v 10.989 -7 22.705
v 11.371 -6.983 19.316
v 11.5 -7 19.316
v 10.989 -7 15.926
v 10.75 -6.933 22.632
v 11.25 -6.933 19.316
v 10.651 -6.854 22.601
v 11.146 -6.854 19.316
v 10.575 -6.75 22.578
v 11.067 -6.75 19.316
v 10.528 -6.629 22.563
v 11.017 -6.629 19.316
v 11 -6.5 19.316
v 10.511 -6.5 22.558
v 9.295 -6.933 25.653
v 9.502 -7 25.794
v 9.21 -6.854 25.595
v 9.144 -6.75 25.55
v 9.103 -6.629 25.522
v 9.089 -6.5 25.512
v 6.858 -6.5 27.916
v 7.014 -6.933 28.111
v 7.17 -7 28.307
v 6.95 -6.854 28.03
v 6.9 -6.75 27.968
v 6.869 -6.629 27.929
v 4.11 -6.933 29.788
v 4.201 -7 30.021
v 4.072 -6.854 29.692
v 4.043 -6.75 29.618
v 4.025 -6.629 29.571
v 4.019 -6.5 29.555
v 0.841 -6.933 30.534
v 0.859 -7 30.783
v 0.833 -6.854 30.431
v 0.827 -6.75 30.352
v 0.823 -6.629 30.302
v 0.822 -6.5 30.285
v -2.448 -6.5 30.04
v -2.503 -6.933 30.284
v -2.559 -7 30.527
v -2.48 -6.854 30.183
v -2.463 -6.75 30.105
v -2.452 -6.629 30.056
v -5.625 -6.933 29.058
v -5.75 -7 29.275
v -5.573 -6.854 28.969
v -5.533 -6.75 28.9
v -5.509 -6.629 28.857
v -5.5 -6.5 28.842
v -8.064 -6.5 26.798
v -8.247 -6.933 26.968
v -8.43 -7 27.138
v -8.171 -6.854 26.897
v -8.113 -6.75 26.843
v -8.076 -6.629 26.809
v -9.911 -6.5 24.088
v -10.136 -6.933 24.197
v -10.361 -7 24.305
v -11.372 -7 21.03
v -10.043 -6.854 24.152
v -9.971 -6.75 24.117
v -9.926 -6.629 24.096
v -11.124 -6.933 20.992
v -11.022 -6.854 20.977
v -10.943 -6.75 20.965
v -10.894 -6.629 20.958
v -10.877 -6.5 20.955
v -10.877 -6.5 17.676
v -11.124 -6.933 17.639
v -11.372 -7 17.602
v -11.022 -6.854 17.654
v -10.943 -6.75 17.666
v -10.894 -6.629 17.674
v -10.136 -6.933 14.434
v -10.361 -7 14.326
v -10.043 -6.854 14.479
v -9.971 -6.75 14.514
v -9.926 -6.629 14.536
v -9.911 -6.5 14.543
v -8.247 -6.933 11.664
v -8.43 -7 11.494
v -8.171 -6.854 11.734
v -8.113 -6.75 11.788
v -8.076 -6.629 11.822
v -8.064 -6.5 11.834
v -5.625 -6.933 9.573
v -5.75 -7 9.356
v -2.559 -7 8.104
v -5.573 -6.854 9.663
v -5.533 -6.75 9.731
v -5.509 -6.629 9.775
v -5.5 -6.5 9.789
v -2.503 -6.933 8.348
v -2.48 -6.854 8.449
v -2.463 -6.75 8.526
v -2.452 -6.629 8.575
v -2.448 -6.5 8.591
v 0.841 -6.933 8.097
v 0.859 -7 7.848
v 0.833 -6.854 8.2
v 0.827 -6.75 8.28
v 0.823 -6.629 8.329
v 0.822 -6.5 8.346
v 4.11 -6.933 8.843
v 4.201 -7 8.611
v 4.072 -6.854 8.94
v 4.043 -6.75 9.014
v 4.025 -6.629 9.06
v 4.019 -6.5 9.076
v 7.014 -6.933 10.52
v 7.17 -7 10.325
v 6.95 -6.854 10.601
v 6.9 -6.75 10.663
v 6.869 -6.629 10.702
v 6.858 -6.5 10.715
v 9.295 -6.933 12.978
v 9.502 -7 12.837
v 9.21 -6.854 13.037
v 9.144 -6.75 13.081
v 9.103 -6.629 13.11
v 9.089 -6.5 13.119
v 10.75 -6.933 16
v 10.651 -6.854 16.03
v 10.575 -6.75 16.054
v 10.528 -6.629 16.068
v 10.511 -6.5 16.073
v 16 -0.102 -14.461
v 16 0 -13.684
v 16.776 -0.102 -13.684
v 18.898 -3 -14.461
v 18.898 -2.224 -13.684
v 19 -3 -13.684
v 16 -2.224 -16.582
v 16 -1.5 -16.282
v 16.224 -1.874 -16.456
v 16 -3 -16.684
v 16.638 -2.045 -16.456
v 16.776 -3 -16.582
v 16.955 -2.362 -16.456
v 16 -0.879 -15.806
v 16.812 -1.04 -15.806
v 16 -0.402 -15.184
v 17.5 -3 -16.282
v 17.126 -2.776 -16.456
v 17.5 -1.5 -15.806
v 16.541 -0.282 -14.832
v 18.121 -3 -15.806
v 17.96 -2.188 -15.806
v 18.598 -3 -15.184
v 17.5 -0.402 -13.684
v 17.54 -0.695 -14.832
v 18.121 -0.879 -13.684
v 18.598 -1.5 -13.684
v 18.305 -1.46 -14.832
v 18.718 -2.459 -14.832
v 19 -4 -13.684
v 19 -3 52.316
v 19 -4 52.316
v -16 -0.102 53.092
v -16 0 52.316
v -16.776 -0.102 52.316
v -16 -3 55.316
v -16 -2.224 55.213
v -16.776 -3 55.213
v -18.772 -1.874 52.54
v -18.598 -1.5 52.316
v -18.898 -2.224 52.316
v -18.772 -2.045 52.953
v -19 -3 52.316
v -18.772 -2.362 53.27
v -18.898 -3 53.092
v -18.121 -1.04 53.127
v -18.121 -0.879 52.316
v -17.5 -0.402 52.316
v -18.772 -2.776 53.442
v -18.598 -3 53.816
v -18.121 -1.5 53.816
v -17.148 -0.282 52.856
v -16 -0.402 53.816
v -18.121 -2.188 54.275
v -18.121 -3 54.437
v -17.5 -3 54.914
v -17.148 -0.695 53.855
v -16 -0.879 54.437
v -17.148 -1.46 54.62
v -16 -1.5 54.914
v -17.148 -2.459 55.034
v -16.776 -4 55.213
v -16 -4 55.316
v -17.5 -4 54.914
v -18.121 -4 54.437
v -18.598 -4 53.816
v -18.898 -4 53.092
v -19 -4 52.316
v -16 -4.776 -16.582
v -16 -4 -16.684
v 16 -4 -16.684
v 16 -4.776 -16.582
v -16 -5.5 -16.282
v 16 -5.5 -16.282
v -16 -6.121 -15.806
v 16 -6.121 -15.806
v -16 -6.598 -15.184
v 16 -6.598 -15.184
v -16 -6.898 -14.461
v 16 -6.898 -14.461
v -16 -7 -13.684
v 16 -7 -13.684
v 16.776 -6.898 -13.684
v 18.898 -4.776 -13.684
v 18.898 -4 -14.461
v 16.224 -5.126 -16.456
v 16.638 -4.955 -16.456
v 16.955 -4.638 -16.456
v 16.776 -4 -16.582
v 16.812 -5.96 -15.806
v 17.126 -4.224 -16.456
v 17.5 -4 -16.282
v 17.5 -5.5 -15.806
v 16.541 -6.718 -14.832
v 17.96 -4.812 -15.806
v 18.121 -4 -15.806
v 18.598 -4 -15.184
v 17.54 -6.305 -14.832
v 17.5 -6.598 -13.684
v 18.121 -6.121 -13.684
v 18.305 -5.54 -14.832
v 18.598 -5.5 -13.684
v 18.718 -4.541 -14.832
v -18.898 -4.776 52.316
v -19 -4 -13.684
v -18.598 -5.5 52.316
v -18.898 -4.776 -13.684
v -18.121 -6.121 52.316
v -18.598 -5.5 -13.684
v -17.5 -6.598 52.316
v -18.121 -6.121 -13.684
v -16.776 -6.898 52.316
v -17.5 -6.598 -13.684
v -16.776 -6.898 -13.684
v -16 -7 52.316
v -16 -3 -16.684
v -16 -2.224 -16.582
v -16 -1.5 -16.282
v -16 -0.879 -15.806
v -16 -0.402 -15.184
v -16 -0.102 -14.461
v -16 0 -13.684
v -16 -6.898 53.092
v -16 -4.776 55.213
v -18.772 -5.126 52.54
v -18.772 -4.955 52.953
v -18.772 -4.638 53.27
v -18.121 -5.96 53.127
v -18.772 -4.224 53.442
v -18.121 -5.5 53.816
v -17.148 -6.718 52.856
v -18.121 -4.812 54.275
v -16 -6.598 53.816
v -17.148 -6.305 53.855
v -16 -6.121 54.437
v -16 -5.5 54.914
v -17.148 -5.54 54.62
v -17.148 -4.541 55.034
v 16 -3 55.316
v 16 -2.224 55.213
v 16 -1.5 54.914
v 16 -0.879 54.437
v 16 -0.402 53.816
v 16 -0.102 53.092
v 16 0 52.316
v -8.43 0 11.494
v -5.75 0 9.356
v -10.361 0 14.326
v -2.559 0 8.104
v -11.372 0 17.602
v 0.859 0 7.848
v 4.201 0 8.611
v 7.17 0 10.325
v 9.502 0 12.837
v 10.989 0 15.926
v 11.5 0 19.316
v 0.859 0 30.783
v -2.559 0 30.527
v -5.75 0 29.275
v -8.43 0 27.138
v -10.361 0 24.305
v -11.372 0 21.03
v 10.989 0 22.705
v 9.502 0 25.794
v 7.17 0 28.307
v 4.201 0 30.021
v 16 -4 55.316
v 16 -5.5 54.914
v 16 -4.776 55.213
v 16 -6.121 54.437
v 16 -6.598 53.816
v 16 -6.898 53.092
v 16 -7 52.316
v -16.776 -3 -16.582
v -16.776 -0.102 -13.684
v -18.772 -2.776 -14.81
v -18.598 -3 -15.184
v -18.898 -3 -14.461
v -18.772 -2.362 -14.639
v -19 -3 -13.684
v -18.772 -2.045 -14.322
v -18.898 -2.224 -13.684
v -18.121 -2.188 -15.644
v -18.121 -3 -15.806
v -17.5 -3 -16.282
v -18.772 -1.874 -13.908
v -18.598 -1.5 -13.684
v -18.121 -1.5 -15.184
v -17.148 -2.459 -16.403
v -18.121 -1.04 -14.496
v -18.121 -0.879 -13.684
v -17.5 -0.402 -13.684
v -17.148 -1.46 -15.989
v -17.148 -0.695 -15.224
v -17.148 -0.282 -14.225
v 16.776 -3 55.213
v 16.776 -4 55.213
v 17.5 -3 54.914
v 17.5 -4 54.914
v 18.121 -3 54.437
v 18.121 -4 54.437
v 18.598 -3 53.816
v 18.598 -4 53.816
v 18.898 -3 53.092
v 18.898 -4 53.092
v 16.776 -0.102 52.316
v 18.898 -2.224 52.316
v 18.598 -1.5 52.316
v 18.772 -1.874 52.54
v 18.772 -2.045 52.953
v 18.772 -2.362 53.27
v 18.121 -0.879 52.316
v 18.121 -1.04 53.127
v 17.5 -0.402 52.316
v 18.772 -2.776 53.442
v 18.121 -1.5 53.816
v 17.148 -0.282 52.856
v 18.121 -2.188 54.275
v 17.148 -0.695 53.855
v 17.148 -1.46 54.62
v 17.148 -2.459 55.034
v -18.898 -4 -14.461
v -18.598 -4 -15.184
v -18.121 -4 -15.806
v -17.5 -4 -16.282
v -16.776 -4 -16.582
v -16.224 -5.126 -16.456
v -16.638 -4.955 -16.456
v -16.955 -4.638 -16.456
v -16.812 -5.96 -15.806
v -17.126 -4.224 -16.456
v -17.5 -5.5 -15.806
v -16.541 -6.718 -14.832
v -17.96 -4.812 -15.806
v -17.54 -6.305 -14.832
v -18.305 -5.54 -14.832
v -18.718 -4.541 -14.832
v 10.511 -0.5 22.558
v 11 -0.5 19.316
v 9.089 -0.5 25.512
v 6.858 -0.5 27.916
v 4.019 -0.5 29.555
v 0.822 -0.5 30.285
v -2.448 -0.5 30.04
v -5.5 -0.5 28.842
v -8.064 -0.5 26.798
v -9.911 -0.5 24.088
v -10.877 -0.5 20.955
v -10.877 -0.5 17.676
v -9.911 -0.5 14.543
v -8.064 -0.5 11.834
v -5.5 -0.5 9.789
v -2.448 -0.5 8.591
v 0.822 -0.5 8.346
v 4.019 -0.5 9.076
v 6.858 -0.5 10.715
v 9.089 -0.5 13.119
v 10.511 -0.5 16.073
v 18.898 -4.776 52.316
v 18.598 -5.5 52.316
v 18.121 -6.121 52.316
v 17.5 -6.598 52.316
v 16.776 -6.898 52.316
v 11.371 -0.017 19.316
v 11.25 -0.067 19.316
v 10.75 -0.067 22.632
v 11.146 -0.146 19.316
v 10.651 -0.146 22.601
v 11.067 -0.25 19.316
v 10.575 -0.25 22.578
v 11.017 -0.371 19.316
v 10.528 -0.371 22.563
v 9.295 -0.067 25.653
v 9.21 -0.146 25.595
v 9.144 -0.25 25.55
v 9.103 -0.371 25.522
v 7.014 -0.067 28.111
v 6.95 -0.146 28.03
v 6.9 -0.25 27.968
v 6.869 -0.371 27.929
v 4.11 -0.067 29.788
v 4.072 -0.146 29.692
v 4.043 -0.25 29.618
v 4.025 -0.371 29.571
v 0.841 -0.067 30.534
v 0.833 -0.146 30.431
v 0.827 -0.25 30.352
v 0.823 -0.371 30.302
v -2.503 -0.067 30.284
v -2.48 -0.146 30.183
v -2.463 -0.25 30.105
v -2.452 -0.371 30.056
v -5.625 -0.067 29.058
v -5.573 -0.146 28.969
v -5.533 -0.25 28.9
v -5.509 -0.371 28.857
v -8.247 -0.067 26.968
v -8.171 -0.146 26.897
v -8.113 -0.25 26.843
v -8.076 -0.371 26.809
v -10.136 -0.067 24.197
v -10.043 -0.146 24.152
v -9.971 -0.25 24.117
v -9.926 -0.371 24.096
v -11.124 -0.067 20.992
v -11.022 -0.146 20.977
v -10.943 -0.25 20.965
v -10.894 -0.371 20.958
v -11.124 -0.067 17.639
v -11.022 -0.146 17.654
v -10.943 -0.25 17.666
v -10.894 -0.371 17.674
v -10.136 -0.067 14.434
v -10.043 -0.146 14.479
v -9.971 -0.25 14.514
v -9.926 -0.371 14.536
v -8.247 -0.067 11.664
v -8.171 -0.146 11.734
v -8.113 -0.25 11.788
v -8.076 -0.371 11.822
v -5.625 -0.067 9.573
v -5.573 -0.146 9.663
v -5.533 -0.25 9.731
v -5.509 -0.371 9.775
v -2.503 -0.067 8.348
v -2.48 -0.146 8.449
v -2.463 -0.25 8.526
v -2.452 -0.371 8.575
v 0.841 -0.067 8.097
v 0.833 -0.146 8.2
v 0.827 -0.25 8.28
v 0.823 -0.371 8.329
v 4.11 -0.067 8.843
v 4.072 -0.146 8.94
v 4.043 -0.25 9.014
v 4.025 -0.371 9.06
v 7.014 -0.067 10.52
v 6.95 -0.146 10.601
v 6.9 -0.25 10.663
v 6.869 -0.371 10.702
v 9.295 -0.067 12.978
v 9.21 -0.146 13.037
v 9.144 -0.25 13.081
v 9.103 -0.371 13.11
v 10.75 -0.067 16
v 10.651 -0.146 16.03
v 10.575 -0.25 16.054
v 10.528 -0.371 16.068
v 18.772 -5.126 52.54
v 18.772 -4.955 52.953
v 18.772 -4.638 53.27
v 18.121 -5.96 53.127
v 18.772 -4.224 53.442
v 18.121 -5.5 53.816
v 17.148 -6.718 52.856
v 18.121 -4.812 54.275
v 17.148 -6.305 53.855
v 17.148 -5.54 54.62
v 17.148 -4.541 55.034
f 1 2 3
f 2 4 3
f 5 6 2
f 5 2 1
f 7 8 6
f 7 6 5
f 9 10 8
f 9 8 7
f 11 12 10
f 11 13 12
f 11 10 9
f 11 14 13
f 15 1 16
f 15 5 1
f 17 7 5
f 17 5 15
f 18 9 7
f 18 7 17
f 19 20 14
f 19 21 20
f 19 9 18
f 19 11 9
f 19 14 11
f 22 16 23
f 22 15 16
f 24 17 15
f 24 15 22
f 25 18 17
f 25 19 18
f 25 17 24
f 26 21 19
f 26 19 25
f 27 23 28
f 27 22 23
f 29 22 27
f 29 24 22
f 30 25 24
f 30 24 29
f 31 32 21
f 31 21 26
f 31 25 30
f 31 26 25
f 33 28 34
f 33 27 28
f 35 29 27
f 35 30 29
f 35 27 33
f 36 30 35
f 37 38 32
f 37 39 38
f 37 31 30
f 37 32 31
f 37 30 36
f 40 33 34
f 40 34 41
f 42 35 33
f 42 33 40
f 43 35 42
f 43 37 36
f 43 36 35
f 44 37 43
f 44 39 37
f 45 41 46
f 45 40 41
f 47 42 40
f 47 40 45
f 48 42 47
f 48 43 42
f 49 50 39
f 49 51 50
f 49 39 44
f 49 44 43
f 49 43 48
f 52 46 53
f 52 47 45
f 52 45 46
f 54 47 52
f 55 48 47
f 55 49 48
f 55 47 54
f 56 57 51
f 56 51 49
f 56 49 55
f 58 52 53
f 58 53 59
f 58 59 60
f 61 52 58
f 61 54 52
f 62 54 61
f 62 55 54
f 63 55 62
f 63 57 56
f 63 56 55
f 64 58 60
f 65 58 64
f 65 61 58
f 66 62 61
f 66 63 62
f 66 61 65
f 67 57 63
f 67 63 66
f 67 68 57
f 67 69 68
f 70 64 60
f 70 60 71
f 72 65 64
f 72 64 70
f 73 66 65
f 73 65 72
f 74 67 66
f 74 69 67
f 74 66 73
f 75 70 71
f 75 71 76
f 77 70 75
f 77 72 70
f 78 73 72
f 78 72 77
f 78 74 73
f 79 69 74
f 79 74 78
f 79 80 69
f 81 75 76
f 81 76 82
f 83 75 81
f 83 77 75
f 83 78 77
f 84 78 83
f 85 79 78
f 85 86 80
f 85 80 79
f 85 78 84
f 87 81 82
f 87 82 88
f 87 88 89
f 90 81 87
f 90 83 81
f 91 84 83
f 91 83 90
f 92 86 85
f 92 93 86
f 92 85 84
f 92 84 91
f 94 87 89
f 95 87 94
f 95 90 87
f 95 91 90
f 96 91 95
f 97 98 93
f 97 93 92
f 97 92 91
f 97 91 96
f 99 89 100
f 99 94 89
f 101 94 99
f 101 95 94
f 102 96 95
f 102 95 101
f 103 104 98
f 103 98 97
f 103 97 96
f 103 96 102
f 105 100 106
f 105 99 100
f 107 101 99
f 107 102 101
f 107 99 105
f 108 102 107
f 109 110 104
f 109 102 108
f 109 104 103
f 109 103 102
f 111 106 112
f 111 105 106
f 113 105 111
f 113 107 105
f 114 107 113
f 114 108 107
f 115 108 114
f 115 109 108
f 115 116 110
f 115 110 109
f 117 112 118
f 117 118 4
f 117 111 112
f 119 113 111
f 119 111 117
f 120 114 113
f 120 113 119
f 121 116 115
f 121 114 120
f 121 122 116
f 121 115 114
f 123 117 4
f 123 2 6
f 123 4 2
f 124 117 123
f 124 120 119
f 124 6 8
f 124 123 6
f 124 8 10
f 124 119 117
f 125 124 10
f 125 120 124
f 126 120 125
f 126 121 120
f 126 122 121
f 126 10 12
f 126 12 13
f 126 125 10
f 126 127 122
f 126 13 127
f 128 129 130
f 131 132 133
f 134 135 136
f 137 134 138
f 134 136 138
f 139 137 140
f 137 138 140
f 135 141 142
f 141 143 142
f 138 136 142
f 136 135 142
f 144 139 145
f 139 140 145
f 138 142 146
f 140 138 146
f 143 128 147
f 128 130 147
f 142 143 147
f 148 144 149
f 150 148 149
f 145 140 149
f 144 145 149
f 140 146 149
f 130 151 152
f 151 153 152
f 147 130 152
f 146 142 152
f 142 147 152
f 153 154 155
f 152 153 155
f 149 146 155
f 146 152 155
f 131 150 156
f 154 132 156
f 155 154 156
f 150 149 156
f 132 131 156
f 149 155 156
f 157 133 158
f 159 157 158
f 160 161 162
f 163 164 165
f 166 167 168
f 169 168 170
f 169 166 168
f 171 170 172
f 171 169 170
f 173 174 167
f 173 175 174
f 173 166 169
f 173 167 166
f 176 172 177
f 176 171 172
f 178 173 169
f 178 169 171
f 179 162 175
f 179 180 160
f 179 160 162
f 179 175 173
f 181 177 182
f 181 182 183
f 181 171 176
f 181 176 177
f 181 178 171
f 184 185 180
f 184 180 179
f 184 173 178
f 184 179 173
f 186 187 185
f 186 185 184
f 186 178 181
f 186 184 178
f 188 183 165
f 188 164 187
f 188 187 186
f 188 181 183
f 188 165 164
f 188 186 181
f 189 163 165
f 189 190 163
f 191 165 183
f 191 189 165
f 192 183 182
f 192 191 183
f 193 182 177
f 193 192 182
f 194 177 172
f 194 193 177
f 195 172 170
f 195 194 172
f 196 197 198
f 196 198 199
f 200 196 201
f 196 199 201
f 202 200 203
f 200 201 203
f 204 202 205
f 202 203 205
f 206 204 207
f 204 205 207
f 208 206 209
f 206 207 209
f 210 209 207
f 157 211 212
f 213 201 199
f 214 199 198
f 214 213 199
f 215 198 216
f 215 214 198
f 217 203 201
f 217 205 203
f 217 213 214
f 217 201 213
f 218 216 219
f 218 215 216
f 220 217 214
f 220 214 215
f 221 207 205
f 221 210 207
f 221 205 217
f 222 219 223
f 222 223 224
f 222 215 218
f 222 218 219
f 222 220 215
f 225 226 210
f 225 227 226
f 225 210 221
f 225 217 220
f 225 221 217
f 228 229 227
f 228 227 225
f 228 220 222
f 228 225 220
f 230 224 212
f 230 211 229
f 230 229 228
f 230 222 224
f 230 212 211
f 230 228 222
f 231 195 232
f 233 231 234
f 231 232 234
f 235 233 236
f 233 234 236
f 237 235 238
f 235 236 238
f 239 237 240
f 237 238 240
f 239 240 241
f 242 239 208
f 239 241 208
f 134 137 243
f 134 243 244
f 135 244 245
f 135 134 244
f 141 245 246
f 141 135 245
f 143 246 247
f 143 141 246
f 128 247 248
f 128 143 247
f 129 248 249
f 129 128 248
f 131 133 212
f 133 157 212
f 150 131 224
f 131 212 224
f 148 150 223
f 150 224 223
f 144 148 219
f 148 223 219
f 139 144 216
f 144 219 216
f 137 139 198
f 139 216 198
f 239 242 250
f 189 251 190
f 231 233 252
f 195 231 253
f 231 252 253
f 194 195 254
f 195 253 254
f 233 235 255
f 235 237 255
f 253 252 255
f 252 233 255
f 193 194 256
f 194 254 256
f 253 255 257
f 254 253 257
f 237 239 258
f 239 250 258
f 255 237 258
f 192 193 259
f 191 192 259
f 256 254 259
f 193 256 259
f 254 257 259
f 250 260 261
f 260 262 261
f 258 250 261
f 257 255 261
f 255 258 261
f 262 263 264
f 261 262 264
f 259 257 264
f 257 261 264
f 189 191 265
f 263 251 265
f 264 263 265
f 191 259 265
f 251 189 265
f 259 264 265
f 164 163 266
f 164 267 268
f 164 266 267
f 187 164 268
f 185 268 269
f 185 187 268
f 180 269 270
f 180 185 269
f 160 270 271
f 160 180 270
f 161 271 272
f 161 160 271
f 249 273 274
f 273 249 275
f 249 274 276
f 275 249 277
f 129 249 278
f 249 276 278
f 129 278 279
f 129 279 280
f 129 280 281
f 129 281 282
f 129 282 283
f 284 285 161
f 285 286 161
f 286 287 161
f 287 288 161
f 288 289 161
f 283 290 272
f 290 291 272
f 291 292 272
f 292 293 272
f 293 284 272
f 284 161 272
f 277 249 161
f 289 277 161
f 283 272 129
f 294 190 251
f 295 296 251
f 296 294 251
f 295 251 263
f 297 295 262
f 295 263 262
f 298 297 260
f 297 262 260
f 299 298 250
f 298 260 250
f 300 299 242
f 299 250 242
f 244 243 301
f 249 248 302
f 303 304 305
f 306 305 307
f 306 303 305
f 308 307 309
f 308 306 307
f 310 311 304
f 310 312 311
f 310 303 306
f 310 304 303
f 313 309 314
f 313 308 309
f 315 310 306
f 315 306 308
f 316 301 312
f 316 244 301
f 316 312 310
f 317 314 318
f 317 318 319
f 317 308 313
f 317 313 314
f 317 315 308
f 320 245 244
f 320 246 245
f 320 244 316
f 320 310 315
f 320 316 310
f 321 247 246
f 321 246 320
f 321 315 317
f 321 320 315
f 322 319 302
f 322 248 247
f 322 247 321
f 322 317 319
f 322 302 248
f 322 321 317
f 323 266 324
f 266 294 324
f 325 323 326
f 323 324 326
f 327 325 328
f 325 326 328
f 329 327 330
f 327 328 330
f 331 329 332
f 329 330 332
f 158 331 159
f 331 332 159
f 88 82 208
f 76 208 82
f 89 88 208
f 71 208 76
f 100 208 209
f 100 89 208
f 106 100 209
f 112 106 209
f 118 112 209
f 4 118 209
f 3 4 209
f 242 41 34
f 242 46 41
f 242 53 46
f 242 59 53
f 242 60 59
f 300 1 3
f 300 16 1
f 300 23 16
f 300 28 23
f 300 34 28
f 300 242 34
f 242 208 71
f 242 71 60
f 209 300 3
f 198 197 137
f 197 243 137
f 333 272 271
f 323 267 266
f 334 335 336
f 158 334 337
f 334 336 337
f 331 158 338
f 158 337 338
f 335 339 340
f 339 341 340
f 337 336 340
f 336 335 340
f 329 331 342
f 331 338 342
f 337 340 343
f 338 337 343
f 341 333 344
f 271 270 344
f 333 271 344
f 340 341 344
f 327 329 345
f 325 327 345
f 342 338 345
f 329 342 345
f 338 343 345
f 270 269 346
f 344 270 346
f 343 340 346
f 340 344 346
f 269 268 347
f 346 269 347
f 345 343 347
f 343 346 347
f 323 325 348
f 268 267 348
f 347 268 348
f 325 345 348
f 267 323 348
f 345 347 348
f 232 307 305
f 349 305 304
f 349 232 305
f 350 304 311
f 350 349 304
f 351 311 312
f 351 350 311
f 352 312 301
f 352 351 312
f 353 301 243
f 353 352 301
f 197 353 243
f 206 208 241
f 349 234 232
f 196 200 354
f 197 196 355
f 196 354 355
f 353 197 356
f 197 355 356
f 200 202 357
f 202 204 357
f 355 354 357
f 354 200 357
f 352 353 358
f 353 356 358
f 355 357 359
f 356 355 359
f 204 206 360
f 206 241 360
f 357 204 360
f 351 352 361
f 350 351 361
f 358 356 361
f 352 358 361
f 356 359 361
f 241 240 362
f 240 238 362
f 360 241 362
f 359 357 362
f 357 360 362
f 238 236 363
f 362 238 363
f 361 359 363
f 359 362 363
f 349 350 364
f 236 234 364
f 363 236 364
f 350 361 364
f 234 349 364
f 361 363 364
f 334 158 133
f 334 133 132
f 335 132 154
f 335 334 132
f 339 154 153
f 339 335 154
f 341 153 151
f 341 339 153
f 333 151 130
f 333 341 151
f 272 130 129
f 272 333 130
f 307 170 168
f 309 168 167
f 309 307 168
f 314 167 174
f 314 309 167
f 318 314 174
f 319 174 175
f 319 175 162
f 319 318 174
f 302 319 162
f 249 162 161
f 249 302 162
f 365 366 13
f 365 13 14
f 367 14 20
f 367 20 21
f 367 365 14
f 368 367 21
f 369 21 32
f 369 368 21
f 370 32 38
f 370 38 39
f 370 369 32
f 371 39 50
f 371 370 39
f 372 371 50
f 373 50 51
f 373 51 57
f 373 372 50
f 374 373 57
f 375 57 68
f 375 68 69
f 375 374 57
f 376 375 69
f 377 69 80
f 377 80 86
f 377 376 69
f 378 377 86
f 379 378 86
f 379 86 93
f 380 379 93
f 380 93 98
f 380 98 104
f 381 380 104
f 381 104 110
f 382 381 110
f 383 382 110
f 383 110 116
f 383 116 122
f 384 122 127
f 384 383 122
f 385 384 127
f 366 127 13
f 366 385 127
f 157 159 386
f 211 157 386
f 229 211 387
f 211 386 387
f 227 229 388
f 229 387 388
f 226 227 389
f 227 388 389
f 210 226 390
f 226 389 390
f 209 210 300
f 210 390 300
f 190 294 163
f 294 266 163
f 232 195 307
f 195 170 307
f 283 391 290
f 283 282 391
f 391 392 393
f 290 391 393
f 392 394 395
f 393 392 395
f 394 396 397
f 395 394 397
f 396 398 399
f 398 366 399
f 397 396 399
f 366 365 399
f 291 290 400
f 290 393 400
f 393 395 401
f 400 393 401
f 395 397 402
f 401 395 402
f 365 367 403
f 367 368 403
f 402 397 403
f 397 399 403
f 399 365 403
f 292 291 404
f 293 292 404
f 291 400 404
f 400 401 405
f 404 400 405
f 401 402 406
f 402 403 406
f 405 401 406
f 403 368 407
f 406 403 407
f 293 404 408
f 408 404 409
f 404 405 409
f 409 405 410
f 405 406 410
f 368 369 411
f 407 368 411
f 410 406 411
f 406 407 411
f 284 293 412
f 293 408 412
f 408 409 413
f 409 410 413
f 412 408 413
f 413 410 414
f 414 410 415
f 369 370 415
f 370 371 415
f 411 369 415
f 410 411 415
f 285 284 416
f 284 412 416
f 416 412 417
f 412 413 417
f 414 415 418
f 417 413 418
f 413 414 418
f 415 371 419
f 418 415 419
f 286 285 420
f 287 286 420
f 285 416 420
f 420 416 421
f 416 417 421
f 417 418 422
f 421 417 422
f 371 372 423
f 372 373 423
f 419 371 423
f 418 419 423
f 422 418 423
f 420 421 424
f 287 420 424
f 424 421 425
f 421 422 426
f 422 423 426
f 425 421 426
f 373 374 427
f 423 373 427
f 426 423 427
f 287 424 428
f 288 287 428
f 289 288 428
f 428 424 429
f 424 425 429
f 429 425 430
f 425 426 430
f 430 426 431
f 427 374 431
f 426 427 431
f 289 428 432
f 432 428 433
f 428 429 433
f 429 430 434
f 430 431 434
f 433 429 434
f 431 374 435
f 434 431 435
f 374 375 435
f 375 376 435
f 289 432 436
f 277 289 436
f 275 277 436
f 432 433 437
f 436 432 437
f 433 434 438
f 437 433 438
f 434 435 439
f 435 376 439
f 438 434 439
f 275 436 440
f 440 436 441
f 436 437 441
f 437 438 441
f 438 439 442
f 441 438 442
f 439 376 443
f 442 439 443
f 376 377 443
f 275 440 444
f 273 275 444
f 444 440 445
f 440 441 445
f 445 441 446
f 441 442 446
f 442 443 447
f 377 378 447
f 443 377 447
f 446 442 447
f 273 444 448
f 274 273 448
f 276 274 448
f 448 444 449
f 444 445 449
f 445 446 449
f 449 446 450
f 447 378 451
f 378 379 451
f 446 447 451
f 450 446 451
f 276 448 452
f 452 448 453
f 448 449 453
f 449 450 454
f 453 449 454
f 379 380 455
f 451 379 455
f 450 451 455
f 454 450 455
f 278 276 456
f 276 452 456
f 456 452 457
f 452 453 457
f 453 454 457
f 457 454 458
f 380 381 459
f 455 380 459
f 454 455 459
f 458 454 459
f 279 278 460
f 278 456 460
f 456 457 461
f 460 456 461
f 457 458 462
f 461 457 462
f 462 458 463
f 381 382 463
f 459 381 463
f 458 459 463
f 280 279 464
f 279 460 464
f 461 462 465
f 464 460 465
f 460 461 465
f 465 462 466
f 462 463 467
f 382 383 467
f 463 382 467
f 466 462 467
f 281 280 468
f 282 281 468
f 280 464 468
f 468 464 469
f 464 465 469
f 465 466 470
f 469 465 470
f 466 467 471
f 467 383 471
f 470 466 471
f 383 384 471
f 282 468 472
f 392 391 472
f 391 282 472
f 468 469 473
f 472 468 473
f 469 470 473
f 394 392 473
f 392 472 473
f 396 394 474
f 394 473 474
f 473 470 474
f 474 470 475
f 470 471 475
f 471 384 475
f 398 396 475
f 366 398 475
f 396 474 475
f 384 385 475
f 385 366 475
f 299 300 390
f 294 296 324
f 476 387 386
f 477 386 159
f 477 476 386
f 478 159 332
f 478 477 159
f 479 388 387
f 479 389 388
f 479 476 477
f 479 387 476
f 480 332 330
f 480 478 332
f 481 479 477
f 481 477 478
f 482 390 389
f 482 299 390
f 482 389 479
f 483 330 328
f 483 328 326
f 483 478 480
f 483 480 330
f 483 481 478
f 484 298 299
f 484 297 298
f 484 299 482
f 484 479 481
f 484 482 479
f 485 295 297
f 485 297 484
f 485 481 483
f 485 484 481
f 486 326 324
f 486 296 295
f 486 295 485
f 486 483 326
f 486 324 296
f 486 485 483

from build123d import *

# Parameters (mm, degrees)
F0_R     = 11
F1_DEPTH = 7
F2_R     = 3
F3_R     = 0.5


with BuildPart() as f1:
    # F0 (on Front) → F1 (new body)
    with BuildSketch(Plane.XZ):
        Polygon((19, 55.315645), (0, 55.315645), (-19, 55.315645), (-19, -16.684355), (0, -16.684355), (19, -16.684355), align=None)
        with Locations((0, 19.315645)):
            Circle(F0_R, mode=Mode.SUBTRACT)
    extrude(amount=F1_DEPTH)

    # F2
    f2_edges = [f1.edges().sort_by_distance(p)[0] for p in [
        (0, -7, 55.315645),
        (0, 0, 55.315645),
        (19, 0, 19.315645),
        (-19, -7, 19.315645),
        (19, -7, 19.315645),
        (0, -7, -16.684355),
        (0, 0, -16.684355),
        (19, -3.5, -16.684355),
        (-19, -3.5, -16.684355),
        (-19, 0, 19.315645),
        (-19, -3.5, 55.315645),
        (19, -3.5, 55.315645),
    ]]
    fillet(f2_edges, radius=F2_R)

    # F3
    f3_edges = [f1.edges().sort_by_distance(p)[0] for p in [
        (-11, -7, 19.315645),
        (-11, 0, 19.315645),
    ]]
    fillet(f3_edges, radius=F3_R)


solid = f1.part
